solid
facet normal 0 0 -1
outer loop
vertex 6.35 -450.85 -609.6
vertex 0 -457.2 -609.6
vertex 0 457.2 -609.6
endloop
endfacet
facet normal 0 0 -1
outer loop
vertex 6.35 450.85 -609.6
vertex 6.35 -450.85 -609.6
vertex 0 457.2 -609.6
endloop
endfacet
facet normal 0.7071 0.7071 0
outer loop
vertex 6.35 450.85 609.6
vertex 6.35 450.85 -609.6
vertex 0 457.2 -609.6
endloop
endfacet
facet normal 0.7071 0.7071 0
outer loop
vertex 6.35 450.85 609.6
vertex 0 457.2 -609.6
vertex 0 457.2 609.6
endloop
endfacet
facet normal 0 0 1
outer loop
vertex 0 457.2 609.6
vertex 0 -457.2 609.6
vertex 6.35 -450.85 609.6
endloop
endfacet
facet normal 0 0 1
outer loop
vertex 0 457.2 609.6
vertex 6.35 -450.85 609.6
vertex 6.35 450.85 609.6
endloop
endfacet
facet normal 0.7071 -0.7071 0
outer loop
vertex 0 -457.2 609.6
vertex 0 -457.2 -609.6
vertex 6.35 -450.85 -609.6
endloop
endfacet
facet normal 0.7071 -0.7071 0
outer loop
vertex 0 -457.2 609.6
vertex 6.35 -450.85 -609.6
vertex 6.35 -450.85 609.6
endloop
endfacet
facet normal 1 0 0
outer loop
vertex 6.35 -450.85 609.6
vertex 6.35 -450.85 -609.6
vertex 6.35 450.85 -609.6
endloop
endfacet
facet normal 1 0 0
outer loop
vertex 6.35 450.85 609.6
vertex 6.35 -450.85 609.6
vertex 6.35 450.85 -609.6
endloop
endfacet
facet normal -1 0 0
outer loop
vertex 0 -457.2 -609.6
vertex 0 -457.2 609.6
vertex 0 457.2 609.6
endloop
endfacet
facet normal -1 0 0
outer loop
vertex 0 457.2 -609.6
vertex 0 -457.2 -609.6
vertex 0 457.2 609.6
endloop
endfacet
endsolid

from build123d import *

# Parameters (mm, degrees)
F0_W     = 914.4
F0_H     = 1219.2
F1_DEPTH = 6.35
F2_SIZE  = 6.34999
F3_SIZE  = 6.34999


# Not quite as in the source:
# - a fillet or chamfer is up to 0.001 mm smaller than in the source, because OpenCascade refuses the exact size


with BuildPart() as f1:
    # F0 (on Right) → F1 (new body)
    with BuildSketch(Plane.YZ):
        Rectangle(F0_W, F0_H)
    extrude(amount=F1_DEPTH)

    # F2 (size 6.35 in the source; OpenCascade refuses exactly that, so slightly less here)
    f2_edges = [f1.edges().sort_by_distance(p)[0] for p in [
        (6.35, 457.2, 0),
    ]]
    chamfer(f2_edges, length=F2_SIZE)

    # F3 (size 6.35 in the source; OpenCascade refuses exactly that, so slightly less here)
    f3_edges = [f1.edges().sort_by_distance(p)[0] for p in [
        (6.35, -457.2, 0),
    ]]
    chamfer(f3_edges, length=F3_SIZE)


solid = f1.part
